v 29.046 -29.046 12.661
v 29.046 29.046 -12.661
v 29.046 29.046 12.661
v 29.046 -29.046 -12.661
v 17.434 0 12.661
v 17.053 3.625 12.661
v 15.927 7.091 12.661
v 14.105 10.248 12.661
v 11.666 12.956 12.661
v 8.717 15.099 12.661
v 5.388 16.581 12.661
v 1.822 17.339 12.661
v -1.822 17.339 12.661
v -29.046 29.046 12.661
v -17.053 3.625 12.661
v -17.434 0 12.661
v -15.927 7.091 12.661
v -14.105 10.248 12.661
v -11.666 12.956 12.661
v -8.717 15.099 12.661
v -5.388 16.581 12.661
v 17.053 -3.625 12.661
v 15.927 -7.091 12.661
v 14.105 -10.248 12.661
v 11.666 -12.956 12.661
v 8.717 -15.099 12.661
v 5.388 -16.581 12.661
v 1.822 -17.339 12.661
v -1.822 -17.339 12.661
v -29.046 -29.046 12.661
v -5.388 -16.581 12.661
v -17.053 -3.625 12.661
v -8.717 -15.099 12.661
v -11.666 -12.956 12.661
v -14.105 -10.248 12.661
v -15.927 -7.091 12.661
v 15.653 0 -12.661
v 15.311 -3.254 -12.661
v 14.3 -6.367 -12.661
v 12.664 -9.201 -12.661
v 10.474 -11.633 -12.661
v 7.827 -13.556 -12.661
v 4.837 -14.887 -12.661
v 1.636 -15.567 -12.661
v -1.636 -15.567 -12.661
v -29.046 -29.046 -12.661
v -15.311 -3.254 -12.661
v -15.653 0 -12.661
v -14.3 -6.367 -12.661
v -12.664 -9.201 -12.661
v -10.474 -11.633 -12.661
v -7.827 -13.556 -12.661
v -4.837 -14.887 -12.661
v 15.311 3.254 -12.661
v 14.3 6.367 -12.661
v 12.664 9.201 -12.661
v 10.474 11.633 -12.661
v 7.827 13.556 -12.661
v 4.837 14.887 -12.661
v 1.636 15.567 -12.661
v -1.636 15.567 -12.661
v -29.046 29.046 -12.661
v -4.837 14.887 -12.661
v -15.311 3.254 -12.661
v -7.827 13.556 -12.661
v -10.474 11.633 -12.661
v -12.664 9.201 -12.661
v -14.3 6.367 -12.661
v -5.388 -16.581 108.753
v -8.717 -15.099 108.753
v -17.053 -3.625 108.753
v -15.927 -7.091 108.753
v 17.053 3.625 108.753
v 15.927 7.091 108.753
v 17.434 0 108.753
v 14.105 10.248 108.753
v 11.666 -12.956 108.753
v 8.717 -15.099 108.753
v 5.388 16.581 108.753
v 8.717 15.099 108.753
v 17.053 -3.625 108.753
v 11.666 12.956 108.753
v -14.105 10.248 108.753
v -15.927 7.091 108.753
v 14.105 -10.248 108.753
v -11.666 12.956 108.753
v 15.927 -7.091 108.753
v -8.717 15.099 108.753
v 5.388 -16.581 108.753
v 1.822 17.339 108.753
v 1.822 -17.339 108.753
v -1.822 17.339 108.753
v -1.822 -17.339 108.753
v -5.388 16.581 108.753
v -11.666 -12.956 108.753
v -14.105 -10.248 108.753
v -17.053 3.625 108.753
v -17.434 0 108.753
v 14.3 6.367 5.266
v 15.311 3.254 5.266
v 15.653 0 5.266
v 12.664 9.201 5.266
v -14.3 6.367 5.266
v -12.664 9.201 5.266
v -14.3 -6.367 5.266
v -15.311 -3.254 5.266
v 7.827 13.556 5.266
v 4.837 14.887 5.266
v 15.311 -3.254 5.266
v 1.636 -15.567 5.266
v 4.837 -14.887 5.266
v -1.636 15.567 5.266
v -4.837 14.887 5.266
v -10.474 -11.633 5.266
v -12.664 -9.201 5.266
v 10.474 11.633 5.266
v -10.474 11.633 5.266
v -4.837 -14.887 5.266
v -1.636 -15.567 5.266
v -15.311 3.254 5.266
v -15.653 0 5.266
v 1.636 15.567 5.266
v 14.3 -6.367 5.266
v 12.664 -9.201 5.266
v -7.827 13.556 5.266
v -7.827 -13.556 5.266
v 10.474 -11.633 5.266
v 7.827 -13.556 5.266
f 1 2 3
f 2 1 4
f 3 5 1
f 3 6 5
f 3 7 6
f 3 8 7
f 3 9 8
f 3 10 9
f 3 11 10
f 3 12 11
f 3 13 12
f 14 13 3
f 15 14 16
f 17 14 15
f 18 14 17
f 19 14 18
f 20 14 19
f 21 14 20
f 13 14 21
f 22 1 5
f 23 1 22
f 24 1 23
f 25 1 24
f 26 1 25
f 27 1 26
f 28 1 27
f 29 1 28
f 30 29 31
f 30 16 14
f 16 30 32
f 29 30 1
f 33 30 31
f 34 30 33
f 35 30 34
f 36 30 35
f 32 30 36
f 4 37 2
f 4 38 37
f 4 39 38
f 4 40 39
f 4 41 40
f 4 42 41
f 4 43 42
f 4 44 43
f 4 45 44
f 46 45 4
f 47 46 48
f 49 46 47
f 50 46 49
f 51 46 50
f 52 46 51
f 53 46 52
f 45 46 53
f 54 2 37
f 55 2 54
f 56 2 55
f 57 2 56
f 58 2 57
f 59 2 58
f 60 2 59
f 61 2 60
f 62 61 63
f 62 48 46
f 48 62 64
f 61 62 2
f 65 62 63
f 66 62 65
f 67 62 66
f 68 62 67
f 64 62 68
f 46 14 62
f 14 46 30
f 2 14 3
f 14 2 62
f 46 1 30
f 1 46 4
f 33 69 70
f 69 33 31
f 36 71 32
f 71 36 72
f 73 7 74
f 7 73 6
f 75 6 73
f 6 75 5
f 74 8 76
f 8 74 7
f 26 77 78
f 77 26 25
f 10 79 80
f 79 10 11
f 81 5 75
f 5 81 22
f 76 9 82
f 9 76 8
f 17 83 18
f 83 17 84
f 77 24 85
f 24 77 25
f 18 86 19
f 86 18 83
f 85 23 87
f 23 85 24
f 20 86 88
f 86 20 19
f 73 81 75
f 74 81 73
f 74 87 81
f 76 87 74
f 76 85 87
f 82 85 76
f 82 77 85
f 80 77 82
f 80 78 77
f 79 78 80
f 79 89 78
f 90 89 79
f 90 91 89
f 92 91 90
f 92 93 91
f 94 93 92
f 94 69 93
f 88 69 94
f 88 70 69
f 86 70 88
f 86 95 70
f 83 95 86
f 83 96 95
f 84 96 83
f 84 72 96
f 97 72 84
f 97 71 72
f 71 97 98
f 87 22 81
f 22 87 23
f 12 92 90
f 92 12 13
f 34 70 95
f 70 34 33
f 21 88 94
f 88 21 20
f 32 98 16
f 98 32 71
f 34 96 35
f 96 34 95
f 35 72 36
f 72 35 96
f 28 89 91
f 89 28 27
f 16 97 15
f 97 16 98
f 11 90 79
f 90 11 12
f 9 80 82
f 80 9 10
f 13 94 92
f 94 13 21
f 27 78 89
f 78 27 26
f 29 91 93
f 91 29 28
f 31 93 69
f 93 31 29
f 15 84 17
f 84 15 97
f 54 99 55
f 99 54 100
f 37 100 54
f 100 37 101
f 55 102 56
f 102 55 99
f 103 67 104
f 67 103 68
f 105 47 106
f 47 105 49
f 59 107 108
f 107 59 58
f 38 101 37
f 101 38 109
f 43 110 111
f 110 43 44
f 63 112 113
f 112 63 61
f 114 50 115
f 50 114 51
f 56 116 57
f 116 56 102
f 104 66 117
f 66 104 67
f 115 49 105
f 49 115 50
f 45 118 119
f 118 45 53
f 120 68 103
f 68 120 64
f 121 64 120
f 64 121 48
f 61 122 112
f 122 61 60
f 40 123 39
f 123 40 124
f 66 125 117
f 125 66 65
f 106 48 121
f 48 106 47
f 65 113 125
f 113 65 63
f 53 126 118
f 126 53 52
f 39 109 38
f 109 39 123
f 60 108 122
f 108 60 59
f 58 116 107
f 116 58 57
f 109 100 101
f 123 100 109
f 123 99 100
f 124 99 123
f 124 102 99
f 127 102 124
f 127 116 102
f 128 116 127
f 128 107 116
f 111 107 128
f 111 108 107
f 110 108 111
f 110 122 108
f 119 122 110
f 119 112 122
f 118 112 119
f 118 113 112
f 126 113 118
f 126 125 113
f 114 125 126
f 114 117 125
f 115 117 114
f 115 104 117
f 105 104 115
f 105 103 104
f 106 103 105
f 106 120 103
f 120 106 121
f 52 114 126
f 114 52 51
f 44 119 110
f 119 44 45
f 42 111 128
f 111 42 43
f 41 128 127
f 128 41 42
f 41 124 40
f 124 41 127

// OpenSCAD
seed = 7;
seeds = rands(0,1000000,10,seed);
head_size = rands(50,100,1,seeds[1])[0];
head_length = rands(10,40,1,seeds[2])[0];
bolt_length = rands(head_length*2,200,1,seeds[3])[0];
bolt_radius = rands(head_size/5, head_size/3,seeds[0])[0];
cylinder_radius = rands(head_size/6, head_size/3,1, seeds[4])[0];
cylinder_length = rands(head_length, head_length*1.5,1, seeds[5])[0];

difference(){
    union(){
        cube([head_size,head_size,head_length], center=true);
        cylinder(bolt_length,bolt_radius,bolt_radius);
    }
    translate([0,0,-head_length/2]){
        cylinder(cylinder_length, cylinder_radius, cylinder_radius, true);
    }
}
